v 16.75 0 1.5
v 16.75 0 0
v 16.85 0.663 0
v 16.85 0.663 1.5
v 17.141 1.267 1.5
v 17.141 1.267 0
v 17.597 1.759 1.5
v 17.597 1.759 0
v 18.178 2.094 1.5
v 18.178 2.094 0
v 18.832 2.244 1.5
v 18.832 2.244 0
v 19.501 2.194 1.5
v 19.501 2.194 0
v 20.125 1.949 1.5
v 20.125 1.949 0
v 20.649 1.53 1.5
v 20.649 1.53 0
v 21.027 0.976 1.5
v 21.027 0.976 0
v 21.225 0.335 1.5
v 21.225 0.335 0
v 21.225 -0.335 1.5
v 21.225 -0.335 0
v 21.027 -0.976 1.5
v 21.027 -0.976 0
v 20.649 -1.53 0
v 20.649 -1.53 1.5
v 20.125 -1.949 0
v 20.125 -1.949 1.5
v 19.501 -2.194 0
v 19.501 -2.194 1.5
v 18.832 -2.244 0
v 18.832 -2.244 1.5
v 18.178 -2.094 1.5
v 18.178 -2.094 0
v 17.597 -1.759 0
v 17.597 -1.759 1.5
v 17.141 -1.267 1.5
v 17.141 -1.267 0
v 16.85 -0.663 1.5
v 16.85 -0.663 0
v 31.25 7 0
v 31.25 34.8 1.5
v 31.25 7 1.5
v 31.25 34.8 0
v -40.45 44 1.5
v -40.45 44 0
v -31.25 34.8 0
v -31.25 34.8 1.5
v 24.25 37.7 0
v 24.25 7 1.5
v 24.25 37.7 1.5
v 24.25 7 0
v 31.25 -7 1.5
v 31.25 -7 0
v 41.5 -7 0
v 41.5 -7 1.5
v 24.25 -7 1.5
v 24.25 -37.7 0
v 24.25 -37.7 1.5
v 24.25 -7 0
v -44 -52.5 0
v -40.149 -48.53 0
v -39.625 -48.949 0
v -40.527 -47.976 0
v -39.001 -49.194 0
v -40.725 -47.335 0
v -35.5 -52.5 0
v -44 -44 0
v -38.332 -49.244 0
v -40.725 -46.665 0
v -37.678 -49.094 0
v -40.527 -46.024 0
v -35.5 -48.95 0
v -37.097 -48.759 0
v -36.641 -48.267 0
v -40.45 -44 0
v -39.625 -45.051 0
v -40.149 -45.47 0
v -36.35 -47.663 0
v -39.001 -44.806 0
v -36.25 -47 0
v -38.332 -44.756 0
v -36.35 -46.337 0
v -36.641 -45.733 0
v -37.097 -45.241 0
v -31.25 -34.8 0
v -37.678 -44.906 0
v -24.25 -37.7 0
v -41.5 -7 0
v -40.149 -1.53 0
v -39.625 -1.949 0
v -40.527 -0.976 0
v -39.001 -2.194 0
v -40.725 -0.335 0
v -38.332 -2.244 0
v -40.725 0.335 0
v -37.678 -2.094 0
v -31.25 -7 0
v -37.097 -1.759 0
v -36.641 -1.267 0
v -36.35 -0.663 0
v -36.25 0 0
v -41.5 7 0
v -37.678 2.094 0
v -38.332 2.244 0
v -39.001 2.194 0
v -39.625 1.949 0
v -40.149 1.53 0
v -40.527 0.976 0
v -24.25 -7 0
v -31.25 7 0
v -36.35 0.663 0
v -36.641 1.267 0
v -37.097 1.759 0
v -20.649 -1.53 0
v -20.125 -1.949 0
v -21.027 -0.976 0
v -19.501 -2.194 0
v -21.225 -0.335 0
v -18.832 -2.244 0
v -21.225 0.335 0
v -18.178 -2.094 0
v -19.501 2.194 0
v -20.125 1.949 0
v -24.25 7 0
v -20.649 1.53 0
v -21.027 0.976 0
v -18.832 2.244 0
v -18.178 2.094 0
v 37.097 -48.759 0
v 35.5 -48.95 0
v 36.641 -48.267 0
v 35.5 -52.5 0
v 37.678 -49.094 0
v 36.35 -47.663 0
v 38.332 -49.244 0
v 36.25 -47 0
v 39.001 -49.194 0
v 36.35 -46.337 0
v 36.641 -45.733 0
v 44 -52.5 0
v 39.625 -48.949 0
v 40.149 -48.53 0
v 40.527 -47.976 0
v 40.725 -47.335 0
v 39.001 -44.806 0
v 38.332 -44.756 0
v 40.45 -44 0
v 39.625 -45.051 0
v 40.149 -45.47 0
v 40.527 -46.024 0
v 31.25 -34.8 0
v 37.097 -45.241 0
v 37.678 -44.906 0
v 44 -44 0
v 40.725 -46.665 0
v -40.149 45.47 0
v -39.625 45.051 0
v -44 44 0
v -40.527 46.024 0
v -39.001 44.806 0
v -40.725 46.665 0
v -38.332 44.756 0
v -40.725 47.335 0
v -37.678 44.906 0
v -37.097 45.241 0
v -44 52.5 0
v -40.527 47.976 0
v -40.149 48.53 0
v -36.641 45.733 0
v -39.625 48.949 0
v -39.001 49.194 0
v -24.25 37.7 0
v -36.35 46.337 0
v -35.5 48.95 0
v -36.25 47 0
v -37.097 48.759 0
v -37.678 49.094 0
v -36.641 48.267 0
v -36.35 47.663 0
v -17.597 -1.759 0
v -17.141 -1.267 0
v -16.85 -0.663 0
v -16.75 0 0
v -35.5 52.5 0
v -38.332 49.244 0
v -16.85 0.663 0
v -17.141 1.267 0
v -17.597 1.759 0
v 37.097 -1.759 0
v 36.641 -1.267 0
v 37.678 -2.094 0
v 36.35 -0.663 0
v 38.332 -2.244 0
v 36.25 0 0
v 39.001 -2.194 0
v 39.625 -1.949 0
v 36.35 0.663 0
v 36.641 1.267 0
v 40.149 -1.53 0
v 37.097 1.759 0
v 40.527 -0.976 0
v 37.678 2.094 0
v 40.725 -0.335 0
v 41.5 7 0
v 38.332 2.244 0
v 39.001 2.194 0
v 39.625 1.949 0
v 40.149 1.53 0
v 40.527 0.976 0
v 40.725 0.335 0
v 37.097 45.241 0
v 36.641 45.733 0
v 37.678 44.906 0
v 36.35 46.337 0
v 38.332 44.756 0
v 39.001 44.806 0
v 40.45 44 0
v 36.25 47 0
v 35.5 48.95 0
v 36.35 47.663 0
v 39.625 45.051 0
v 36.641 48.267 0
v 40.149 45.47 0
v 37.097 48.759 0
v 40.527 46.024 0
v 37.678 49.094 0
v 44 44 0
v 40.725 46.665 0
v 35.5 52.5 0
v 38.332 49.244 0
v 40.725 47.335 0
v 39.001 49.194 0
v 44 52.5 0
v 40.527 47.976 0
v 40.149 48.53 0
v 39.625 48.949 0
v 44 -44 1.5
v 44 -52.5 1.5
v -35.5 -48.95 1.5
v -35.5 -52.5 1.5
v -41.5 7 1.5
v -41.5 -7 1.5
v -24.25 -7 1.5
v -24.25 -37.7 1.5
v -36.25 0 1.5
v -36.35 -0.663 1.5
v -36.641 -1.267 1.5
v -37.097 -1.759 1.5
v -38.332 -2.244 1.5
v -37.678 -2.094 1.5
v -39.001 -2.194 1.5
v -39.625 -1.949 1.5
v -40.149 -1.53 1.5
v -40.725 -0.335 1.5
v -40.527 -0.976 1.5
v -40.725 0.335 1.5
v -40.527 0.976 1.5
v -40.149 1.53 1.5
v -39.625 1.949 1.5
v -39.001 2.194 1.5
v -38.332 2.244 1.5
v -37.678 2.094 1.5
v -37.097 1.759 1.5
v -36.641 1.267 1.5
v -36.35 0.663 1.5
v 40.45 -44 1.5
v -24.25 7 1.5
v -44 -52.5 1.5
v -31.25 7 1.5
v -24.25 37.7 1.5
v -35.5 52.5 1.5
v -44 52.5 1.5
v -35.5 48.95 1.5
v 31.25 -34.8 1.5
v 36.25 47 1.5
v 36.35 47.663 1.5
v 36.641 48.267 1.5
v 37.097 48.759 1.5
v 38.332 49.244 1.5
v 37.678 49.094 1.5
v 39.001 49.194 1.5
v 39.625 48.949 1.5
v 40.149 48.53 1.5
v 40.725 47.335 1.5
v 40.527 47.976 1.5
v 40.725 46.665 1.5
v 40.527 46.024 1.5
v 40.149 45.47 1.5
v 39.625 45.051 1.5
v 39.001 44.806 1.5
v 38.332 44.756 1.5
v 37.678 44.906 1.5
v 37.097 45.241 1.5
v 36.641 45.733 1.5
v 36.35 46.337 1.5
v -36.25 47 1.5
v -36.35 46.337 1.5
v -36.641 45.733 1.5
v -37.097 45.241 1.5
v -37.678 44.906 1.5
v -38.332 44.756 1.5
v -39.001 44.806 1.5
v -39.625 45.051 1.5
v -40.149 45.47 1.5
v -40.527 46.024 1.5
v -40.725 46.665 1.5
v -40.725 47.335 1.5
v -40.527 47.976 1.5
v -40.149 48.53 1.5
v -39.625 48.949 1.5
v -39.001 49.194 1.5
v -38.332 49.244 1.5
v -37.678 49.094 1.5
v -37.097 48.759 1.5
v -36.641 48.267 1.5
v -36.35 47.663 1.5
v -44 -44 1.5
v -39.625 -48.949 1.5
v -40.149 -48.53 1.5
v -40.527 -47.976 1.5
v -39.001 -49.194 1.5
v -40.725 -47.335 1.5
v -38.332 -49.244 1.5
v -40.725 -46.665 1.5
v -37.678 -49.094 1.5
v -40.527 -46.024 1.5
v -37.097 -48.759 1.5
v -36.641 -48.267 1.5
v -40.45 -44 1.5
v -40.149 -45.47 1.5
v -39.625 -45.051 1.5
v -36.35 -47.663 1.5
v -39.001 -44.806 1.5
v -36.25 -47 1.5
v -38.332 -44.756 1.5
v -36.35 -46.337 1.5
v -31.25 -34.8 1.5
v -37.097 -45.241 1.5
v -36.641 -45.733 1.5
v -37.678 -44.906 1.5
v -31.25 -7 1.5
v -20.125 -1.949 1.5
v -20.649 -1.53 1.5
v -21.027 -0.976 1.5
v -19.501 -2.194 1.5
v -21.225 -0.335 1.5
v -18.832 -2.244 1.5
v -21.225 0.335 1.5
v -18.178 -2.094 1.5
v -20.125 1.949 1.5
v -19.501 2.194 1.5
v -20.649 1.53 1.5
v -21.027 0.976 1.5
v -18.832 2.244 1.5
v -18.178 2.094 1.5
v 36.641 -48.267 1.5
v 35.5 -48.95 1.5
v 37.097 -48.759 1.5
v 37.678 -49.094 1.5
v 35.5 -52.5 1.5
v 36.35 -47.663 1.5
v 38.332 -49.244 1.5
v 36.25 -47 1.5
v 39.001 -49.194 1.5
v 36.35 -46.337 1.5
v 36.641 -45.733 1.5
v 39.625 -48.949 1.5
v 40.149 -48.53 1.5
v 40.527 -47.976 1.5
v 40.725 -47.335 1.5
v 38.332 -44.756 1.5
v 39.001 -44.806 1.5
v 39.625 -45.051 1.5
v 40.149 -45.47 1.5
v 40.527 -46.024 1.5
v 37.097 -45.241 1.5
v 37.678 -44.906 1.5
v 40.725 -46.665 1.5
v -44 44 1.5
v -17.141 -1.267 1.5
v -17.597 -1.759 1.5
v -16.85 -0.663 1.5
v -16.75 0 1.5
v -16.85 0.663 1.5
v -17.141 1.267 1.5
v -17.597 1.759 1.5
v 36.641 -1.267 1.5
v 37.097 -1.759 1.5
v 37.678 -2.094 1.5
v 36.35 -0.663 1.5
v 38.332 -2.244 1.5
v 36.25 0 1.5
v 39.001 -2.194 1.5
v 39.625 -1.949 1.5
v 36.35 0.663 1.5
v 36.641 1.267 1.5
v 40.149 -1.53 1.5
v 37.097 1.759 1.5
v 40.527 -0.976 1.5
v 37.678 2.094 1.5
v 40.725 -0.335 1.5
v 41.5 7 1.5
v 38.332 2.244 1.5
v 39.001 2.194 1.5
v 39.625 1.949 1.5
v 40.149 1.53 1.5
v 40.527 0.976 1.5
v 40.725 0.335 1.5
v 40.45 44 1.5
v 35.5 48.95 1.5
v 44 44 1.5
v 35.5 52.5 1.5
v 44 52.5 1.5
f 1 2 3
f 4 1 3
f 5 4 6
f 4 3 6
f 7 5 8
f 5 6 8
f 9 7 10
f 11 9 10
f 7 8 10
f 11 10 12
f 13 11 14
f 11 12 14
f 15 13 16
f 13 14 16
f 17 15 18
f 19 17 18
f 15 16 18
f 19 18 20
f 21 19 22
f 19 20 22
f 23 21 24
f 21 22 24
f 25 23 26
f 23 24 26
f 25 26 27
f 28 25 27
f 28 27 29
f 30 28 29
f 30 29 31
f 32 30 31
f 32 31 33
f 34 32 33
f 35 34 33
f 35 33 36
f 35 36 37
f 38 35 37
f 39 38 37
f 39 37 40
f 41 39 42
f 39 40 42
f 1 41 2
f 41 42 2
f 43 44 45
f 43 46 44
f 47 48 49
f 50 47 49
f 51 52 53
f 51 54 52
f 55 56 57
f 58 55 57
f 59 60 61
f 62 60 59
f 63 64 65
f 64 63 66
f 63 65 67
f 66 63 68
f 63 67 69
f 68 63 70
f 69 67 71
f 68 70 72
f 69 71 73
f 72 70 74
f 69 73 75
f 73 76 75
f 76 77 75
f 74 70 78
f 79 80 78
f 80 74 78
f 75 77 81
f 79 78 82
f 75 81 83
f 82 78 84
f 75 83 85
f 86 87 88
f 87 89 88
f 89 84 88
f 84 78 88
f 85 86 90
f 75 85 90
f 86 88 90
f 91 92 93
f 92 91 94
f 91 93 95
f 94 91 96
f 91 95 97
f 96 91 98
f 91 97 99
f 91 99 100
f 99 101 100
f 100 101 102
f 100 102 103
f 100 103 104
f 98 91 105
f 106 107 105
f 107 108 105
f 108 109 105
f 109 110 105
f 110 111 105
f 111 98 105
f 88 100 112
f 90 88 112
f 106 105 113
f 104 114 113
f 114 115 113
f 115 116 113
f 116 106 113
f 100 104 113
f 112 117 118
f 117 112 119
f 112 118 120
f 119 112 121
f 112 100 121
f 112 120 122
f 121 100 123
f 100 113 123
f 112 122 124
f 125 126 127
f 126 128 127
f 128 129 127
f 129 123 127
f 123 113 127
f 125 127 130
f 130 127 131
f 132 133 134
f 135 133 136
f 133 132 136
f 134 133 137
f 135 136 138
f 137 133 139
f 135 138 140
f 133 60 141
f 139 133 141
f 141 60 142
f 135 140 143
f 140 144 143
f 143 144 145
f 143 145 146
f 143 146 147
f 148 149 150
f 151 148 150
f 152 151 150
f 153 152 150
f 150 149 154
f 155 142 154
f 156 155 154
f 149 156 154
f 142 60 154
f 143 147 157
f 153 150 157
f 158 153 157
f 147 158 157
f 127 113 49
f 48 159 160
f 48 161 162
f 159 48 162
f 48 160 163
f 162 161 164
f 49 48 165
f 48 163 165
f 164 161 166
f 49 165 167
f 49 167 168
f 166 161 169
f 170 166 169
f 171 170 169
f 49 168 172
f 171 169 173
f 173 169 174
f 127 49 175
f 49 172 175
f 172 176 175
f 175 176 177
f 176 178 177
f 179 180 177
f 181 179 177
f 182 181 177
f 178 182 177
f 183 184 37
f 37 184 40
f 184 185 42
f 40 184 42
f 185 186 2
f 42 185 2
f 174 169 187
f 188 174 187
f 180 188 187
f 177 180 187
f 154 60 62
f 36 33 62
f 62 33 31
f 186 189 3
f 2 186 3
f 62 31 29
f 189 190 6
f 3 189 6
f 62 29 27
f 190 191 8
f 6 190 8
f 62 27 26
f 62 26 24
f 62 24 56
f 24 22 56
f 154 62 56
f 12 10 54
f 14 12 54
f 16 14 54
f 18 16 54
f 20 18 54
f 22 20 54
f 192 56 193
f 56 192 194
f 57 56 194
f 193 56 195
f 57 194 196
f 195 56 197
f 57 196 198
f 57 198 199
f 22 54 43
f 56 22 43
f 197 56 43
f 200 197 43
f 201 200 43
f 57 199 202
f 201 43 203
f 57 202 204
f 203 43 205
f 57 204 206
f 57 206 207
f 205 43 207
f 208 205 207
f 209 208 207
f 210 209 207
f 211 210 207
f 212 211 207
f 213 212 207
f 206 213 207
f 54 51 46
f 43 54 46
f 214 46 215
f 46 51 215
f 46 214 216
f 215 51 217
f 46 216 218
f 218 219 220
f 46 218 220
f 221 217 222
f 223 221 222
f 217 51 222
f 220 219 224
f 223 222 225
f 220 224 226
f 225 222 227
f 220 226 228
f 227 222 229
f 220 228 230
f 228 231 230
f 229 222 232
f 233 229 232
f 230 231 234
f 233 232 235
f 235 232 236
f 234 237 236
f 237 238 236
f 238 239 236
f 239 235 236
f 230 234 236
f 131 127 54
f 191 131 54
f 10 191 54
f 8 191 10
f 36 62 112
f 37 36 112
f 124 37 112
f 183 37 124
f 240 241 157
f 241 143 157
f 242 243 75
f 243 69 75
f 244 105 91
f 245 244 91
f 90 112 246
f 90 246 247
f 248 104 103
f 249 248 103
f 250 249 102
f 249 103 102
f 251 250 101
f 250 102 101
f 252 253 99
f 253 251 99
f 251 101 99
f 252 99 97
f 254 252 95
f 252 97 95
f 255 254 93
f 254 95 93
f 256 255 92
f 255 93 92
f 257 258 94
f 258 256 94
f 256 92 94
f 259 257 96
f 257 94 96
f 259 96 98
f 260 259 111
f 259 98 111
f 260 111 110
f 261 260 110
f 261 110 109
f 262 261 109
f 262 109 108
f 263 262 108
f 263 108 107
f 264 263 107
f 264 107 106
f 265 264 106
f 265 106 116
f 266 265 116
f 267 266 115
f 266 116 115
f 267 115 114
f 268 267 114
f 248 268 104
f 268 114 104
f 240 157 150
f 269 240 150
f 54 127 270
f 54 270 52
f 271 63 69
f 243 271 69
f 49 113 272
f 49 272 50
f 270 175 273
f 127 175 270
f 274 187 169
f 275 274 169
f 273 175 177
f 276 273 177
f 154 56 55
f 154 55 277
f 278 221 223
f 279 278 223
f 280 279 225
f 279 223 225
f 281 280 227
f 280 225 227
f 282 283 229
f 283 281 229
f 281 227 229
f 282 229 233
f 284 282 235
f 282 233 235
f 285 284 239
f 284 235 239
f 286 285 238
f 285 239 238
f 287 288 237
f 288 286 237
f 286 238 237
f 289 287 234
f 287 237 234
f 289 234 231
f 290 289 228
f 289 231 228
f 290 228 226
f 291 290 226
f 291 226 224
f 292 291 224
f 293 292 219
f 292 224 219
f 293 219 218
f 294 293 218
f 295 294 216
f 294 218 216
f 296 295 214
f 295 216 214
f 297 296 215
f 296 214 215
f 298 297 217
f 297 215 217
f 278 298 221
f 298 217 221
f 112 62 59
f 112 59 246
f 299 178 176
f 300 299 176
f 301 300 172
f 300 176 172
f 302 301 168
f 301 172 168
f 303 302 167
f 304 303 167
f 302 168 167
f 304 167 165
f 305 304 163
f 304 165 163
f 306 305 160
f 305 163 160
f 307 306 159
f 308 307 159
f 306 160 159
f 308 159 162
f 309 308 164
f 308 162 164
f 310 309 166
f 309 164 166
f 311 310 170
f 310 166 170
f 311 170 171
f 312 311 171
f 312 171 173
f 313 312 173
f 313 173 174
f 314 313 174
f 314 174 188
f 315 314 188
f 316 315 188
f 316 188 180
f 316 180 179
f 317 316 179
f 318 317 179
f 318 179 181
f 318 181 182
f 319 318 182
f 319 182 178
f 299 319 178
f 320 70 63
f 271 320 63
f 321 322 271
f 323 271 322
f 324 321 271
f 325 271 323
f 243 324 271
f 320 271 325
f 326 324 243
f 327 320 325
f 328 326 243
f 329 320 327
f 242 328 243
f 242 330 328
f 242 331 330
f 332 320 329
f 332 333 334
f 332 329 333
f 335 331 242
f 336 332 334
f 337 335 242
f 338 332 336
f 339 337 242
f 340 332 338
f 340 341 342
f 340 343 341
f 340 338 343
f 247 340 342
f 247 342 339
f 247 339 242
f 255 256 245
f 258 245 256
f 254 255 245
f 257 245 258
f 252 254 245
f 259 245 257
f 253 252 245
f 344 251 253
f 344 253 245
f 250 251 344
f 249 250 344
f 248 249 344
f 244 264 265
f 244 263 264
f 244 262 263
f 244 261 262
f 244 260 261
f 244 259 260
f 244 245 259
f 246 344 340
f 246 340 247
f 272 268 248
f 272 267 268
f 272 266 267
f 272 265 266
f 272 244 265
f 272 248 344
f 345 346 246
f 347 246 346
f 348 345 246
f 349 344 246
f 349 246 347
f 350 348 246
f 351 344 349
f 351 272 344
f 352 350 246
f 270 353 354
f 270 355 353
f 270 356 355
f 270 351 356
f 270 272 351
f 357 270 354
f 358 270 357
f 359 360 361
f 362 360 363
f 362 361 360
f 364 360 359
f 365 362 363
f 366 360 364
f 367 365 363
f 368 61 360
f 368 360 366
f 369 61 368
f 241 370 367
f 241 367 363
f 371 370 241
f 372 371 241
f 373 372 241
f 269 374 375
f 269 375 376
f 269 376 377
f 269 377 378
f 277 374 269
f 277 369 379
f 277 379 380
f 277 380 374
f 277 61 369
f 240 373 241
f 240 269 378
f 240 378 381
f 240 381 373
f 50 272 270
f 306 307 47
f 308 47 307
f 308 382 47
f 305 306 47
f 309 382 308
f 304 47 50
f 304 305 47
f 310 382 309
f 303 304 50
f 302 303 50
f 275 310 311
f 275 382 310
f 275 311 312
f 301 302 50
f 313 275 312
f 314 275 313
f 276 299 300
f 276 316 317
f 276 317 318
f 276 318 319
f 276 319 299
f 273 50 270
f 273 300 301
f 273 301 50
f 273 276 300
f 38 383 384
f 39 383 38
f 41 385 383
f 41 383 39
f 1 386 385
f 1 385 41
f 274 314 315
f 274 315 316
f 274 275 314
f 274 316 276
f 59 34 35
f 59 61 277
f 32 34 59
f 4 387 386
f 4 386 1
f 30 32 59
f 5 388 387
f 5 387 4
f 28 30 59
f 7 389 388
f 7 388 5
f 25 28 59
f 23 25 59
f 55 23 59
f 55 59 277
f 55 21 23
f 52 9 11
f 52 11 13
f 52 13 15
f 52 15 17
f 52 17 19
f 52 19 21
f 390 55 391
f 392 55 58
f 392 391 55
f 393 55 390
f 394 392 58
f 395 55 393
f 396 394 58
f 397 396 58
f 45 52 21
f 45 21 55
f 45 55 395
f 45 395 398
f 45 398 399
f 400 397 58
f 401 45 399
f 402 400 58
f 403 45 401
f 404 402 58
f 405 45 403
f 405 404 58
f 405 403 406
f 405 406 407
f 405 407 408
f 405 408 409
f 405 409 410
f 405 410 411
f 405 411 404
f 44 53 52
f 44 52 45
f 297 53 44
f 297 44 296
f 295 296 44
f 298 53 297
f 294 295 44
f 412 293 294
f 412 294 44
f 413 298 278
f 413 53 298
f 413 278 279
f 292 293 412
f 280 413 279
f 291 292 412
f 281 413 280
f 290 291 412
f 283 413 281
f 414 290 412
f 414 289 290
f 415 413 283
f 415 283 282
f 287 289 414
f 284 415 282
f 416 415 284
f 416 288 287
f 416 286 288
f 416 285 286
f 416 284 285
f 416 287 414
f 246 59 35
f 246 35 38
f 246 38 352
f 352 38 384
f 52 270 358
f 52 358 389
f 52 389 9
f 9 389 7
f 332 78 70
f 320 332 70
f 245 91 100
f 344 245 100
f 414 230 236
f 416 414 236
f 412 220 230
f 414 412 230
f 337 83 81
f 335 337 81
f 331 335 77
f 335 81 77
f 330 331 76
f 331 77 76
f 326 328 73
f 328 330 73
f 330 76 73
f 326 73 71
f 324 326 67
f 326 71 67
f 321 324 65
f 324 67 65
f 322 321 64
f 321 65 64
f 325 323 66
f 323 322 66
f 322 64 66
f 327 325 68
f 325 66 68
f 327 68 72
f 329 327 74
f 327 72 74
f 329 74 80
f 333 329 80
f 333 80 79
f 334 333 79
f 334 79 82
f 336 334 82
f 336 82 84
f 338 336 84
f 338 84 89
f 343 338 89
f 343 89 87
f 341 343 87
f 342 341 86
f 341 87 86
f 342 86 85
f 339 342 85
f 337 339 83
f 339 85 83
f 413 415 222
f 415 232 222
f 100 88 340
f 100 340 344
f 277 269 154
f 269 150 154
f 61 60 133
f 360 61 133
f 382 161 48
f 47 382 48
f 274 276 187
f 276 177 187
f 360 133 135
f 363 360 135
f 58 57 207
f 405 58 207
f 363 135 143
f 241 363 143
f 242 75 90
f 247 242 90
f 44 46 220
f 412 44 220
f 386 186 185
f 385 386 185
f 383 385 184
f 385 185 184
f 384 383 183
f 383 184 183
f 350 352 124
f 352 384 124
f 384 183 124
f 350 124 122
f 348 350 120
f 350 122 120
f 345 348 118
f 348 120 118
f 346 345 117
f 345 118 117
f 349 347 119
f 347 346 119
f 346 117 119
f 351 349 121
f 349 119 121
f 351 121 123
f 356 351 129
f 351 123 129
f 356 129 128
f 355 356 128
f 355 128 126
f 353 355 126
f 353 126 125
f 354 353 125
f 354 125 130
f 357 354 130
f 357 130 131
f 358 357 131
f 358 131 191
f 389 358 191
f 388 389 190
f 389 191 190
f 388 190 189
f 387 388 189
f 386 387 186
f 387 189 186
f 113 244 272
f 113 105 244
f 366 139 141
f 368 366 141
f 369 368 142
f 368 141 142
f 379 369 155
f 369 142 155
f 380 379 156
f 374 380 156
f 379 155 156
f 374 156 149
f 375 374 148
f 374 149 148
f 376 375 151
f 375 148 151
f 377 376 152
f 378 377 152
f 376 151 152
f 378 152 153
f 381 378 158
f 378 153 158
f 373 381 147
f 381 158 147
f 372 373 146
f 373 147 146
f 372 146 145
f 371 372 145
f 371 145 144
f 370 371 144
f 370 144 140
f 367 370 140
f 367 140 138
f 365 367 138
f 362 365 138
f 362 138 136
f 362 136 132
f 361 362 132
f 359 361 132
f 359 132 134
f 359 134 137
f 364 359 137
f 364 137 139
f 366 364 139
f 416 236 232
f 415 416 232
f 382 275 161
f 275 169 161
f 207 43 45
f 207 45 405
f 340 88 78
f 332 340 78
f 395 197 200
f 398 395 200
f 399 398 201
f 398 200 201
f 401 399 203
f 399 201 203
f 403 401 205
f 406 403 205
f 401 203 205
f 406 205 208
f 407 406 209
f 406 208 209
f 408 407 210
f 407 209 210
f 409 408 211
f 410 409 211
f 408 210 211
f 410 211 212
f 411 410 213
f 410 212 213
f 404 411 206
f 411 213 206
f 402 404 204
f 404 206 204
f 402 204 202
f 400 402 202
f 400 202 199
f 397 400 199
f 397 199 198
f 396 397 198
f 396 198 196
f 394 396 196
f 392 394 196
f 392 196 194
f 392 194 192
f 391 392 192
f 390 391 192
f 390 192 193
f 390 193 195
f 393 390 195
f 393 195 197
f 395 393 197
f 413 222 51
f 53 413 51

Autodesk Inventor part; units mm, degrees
ref_plane "YZ Plane" through (0, 0, 0) normal (1, 0, 0) x (0, 1, 0)
ref_plane "XZ Plane" through (0, 0, 0) normal (0, 1, 0) x (-1, 0, 0)
ref_plane "XY Plane" through (0, 0, 0) normal (0, 0, 1) x (1, 0, 0)
sketch "Sketch1" plane through (0, 0, 0) normal (0, 0, 1) x (1, 0, 0)
  line L0 (-41.5, 50) -> (41.5, 50) construction
  line L1 (41.5, 50) -> (41.5, -50) construction
  line L2 (41.5, -50) -> (-41.5, -50) construction
  line L3 (-41.5, -50) -> (-41.5, 50) construction
  line L4 (0, 52.1292) -> (0, -48.3366) construction
  line L5 (-75.7124, 0) -> (96.9256, 0) construction
  circle A0 centre (-38.5, 47) radius 2.25
  line L6 (-31.25, 7) -> (0, 7)
  line L7 (0, 7) -> (0, -7)
  line L8 (0, -7) -> (-31.25, -7)
  line L9 (-31.25, -7) -> (-31.25, 7)
  circle A1 centre (-19, 0) radius 2.25
  line L10 (38.5, 47) -> (-38.5, 47) construction
  line L11 (-38.5, 47) -> (-38.5, -47) construction
  line L12 (-38.5, -47) -> (38.5, -47) construction
  line L13 (38.5, -47) -> (38.5, 47) construction
  circle A2 centre (38.5, 47) radius 2.25
  circle A3 centre (38.5, -47) radius 2.25
  circle A4 centre (-38.5, -47) radius 2.25
  line L14 (-31.25, -7) -> (-24.25, -7)
  line L15 (-24.25, -7) -> (-24.25, -37.6997)
  line L16 (-24.25, -37.6997) -> (-31.25, -37.6997)
  line L17 (-31.25, -37.6997) -> (-31.25, -7)
  line L18 (-44, -47.5503) -> (-39.0503, -52.5)
  line L19 (-39.0503, -52.5) -> (-24.25, -37.6997)
  line L20 (-24.25, -37.6997) -> (-29.1997, -32.75)
  line L21 (-29.1997, -32.75) -> (-44, -47.5503)
  line L22 (-26.7249, -35.2249) -> (-41.5251, -50.0251) construction
  line L23 (-41.5, -50) -> (-10.8193, -19.3193) construction
  line L24 (-41.5, -50) -> (1.8891, -50) construction
  line L25 (-35.5, -44) -> (-44, -44)
  line L26 (-44, -44) -> (-44, -52.5)
  line L27 (-44, -52.5) -> (-35.5, -52.5)
  line L28 (-35.5, -52.5) -> (-35.5, -44)
  circle A5 centre (-38.5, 0) radius 2.25
  line L29 (-31.25, 7) -> (-41.5, 7)
  line L30 (-41.5, 7) -> (-41.5, -7)
  line L31 (-41.5, -7) -> (-31.25, -7)
  line L32 (-31.25, -7) -> (-31.25, 7)
  point P0 (0, 0)
  point P1 (41.5, 0)
  point P2 (0, 50)
  dimension "d0" = 83
  dimension "d3" = 4.5
  dimension "d5" = 3
  dimension "d9" = 14
  dimension "d10" = 4.5
  dimension "d11" = 19
  dimension "d14" = 100
  dimension "d16" = 3
  dimension "d17" = 4.5
  dimension "d18" = 4.5
  dimension "d19" = 4.5
  dimension "d20" = 7
  dimension "d21" = 7
  dimension "d22" = 45
  dimension "d23" = 3
  dimension "d24" = 5.5
  dimension "d25" = 5.5
  dimension "d26" = 3
  dimension "d27" = 3
  dimension "d28" = 4.5
extrude "Extrusion1" add sketch "Sketch1" along normal blind 1.5 contours L6 L7 L8 L9 | L9 L31 L30 L29 | L8 L15 L20 L21 L17 | L21 L20 L16 L17 | L17 L16 L19 L28 L25 L21 | L25 L28 L19 L18 L21 | L21 L26 L25 | L28 L27 L19 | L18 L27 L26
mirror "Mirror1" about plane through (0, 0, 0) normal (1, 0, 0) of "Extrusion1"
mirror "Mirror2" about plane through (0, 0, 0) normal (0, 1, 0) of "Extrusion1", "Mirror1"
properties part number "MotorSideHolder"
